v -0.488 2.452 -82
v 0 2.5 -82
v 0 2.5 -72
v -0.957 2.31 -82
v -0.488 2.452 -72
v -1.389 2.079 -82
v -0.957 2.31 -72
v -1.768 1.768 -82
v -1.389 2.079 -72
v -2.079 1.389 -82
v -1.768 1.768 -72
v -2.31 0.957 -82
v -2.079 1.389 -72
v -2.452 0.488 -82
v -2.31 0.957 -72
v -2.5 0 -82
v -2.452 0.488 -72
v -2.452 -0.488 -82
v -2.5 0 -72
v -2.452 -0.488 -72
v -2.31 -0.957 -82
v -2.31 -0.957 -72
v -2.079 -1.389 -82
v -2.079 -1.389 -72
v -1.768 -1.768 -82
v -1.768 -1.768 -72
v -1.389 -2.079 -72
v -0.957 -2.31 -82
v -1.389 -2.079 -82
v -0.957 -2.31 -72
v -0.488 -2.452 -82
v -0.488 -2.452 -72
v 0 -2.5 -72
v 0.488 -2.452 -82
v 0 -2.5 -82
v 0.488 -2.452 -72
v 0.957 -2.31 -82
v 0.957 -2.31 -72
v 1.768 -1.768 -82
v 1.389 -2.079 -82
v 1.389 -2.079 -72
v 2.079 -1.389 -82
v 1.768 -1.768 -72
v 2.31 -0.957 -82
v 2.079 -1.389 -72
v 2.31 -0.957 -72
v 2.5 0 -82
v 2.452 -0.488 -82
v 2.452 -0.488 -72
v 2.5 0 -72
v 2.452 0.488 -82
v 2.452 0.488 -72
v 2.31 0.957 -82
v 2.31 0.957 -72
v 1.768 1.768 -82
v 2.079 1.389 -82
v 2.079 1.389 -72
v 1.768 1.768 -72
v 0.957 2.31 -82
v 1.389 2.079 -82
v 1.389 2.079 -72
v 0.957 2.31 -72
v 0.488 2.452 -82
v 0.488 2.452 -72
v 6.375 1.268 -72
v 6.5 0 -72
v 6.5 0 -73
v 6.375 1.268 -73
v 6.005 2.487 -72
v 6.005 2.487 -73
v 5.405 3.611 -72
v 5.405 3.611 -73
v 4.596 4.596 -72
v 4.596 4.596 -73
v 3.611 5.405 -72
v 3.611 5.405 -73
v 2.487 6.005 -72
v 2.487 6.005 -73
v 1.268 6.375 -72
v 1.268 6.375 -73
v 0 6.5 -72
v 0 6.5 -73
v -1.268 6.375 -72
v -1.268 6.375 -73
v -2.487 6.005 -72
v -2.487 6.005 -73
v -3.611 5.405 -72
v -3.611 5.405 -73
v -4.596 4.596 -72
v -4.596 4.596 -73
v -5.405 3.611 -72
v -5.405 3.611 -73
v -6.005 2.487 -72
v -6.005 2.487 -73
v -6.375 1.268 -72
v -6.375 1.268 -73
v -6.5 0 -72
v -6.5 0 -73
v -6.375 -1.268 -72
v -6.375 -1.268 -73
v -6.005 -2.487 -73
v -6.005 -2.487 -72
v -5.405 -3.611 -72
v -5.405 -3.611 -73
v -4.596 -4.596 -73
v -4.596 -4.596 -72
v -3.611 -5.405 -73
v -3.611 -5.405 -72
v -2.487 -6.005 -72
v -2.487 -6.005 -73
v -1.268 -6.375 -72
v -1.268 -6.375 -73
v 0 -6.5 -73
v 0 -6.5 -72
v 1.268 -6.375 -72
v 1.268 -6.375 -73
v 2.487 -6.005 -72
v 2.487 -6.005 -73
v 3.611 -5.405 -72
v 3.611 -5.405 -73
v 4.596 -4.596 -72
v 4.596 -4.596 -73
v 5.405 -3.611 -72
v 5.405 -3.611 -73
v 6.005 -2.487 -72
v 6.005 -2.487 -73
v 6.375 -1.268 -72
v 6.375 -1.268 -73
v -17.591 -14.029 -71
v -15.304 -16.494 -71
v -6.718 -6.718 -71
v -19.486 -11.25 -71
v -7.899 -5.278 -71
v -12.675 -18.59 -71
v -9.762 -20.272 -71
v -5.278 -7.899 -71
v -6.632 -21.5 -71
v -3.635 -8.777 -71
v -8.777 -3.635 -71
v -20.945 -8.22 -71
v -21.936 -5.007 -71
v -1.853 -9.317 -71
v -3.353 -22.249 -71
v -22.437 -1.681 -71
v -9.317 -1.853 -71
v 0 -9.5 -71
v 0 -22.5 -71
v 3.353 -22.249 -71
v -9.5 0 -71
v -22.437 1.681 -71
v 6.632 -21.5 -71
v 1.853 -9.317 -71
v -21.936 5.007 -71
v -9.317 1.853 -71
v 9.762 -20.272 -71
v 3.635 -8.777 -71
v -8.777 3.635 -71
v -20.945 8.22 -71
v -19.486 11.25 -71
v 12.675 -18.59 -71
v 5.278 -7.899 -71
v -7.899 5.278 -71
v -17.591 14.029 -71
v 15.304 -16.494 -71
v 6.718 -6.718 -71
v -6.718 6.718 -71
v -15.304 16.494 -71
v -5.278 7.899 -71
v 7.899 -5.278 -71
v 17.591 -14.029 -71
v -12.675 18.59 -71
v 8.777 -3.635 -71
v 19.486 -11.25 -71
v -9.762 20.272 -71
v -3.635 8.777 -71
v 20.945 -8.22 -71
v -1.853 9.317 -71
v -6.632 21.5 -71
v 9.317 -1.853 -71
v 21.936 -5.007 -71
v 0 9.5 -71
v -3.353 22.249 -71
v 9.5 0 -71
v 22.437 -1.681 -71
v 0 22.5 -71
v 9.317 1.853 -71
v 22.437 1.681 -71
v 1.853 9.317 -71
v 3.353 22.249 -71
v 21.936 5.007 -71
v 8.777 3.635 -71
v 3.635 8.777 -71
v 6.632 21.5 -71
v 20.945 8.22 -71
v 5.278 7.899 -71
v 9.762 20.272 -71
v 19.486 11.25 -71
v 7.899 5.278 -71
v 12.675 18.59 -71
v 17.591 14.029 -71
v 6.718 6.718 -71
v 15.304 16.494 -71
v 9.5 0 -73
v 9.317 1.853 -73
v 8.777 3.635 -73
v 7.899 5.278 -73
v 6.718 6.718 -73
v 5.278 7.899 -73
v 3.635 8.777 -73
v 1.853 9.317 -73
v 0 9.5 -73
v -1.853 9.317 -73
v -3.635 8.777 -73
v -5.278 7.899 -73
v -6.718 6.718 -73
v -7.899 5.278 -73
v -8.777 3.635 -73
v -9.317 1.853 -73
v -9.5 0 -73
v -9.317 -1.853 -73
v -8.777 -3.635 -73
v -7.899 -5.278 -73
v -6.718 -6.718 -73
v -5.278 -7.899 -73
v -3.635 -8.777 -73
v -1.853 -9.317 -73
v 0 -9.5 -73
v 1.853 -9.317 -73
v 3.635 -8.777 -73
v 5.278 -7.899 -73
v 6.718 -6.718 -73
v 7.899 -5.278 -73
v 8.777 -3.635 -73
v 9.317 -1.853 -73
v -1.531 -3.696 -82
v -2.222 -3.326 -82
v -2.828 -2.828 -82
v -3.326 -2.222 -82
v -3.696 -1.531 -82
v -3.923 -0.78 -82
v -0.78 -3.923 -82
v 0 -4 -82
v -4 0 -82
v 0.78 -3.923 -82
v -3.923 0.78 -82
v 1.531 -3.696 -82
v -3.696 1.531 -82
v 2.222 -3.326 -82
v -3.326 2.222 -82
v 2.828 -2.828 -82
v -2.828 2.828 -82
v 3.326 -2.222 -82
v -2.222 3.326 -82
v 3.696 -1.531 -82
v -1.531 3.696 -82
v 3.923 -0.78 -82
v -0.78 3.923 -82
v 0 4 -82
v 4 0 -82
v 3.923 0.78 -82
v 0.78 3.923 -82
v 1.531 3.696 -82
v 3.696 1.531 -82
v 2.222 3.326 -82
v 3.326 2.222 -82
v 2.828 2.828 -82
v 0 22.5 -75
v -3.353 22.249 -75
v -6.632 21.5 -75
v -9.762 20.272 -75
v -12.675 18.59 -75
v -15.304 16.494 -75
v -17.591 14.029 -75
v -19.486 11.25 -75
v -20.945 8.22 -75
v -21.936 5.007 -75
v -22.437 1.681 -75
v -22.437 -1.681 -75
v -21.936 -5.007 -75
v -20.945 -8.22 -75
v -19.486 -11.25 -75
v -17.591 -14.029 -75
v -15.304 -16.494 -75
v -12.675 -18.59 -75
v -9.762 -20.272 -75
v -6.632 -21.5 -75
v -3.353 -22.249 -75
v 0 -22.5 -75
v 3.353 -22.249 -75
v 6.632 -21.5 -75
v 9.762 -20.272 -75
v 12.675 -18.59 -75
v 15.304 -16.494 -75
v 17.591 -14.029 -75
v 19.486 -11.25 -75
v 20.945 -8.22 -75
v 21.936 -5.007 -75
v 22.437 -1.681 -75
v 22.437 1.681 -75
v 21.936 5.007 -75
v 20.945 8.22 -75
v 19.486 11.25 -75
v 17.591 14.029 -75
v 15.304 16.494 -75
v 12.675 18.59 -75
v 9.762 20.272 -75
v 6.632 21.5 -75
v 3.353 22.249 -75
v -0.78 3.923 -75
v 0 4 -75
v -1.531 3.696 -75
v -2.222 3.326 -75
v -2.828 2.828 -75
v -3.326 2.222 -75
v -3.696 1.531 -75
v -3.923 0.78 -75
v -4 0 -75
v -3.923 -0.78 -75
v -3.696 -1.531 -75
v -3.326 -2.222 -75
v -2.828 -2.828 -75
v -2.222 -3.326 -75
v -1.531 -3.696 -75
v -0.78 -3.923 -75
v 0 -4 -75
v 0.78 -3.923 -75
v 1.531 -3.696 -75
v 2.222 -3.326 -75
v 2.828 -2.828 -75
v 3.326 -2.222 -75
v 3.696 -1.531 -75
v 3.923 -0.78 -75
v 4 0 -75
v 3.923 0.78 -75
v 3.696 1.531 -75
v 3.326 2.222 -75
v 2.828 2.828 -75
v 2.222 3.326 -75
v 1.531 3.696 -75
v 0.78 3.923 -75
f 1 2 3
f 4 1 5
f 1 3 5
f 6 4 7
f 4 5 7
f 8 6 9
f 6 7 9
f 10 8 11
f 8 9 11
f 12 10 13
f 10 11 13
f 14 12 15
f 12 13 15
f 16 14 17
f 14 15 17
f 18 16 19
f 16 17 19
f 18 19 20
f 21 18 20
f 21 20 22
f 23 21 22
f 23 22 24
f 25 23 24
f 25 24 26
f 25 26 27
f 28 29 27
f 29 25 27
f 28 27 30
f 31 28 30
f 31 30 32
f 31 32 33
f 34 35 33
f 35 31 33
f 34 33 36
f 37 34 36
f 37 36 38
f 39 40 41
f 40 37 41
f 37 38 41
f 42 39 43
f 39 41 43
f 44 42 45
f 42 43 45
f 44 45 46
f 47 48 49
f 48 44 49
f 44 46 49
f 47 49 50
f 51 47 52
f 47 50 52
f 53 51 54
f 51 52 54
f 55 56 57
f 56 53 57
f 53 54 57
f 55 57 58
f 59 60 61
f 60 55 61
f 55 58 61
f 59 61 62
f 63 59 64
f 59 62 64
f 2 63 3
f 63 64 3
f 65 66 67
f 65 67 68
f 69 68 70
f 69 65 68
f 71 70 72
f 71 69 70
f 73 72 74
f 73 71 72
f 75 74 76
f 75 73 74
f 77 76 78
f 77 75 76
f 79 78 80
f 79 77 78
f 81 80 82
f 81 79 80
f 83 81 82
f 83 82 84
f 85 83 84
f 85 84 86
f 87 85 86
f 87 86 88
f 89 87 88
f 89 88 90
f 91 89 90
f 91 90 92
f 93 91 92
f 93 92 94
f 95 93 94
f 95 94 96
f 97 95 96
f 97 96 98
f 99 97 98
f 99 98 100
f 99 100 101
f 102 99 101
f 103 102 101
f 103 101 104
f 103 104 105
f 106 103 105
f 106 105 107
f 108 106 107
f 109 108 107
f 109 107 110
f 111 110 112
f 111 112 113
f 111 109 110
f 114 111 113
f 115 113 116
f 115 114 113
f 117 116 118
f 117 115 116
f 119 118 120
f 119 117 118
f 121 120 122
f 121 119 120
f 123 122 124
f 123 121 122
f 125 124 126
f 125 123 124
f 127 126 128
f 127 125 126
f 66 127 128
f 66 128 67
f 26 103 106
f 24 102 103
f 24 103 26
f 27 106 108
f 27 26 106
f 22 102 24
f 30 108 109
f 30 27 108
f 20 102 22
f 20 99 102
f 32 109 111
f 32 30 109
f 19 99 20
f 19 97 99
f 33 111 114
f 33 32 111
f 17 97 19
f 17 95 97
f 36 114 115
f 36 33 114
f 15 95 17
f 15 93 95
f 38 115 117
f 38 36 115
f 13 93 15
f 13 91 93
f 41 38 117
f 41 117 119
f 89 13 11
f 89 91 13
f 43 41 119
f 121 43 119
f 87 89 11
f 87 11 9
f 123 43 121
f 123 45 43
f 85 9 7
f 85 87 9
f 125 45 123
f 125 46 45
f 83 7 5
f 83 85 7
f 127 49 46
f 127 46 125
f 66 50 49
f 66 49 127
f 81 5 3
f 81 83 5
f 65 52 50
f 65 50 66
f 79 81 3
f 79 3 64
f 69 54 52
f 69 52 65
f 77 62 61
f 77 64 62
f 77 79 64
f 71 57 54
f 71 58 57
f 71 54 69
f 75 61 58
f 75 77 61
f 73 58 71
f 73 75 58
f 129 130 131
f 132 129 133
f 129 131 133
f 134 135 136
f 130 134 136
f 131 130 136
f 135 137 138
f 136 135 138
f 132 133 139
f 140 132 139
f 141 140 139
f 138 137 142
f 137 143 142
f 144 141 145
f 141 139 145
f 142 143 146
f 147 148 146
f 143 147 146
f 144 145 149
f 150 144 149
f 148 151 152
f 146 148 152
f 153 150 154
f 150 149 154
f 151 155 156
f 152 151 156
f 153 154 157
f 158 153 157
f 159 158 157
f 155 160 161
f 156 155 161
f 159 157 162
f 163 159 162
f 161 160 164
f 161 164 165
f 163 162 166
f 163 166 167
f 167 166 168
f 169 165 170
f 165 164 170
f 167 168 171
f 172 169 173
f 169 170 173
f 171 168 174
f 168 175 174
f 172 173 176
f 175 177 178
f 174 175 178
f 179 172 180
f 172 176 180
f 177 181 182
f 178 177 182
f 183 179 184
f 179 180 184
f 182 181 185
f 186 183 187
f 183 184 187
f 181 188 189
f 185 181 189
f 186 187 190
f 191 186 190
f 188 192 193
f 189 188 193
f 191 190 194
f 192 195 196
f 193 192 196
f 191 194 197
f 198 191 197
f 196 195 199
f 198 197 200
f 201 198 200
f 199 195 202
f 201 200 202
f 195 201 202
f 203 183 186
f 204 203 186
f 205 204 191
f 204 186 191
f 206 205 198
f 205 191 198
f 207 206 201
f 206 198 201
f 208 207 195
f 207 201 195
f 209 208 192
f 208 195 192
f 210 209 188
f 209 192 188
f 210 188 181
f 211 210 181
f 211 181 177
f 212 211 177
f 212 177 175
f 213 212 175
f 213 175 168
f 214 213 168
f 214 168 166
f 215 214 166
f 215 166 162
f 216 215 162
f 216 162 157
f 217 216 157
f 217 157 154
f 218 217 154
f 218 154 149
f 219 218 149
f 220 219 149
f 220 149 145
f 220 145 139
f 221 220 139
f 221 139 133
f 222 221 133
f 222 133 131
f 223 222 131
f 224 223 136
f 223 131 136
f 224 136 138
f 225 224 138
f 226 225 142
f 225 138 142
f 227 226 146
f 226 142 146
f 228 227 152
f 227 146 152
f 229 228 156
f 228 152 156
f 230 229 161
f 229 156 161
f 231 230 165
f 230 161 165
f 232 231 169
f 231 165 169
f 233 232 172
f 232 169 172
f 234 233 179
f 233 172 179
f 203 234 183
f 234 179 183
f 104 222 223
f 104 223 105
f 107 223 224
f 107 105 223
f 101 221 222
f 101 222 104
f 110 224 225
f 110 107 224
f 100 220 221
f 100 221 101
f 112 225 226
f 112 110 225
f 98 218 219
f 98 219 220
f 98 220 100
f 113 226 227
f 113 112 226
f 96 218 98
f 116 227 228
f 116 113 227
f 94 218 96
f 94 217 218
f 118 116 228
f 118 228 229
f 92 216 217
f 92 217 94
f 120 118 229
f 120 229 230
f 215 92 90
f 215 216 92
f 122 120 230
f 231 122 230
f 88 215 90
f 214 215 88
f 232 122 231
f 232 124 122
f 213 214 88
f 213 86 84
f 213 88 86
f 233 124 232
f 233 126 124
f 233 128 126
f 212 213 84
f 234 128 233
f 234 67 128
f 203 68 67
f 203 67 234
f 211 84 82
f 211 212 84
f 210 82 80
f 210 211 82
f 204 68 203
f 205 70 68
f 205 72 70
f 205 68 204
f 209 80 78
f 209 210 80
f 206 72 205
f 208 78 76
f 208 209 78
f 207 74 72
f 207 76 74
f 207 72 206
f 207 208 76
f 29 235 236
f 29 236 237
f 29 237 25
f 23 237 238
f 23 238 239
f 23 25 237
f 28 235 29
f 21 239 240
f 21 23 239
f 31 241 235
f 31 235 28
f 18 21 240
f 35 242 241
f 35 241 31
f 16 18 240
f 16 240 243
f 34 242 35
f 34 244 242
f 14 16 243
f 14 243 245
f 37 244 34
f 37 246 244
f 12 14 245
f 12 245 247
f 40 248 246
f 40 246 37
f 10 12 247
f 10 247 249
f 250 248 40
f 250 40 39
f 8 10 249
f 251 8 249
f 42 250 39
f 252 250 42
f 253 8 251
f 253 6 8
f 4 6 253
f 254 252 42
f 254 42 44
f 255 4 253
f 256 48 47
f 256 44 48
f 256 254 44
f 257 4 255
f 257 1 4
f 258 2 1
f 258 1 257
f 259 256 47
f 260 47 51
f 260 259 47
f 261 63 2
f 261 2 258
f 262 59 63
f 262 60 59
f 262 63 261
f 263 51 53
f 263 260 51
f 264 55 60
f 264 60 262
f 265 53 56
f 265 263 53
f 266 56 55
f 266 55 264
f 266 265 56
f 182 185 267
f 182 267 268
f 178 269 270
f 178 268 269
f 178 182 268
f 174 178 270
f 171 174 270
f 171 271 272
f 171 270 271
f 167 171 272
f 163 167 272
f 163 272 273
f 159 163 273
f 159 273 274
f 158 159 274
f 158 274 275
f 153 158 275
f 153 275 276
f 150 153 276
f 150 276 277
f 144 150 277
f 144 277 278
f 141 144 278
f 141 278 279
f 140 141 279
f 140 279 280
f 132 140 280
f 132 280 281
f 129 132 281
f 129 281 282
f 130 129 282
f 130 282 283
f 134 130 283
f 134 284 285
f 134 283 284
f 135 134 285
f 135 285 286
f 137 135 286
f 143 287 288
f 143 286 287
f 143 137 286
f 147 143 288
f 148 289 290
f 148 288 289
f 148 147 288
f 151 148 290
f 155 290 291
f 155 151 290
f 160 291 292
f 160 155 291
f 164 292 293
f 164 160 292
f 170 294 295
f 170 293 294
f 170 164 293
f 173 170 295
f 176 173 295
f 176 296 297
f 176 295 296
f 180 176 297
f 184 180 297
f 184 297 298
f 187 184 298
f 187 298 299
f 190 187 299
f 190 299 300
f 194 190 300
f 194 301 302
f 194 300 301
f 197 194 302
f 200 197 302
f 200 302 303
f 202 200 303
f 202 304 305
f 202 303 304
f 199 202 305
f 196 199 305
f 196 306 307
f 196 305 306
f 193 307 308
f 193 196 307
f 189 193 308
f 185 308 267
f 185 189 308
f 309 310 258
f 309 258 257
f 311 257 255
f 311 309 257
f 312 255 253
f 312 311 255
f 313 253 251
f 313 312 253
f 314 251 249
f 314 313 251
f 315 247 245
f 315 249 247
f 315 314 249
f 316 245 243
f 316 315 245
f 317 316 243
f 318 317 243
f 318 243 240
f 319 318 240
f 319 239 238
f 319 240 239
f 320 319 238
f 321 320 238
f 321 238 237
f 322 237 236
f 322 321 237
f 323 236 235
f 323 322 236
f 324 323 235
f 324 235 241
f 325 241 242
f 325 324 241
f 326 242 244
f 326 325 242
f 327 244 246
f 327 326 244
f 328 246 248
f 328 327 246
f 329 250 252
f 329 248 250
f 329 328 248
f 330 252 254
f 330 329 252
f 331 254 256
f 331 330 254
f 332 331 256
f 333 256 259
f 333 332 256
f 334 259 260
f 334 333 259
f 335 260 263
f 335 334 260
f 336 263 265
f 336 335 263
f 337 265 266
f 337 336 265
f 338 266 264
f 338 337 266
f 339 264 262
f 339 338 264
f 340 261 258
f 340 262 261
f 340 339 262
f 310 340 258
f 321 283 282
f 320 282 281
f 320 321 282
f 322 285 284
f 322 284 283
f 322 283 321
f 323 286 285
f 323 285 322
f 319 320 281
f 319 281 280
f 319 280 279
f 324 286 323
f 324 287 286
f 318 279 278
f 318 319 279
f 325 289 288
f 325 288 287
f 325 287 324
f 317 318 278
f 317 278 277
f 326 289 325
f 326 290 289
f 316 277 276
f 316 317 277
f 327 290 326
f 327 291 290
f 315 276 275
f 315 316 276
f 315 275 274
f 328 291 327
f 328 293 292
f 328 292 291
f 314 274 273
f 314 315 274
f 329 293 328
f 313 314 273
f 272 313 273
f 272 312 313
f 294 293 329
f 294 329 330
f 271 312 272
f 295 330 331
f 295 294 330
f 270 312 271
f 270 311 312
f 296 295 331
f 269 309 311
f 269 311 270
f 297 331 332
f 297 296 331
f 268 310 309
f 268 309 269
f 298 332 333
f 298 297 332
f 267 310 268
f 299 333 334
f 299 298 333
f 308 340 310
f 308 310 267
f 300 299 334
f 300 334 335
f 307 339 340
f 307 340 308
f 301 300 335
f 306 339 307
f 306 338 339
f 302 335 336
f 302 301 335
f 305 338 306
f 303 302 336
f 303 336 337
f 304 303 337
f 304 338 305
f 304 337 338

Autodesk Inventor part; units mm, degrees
ref_plane "YZ Plane" through (0, 0, 0) normal (1, 0, 0) x (0, 1, 0)
ref_plane "XZ Plane" through (0, 0, 0) normal (0, 1, 0) x (-1, 0, 0)
ref_plane "XY Plane" through (0, 0, 0) normal (0, 0, 1) x (1, 0, 0)
sketch "Sketch1" plane through (0, 0, 0) normal (1, 0, 0) x (0, 1, 0)
  line L0 (0, 0) -> (2.5, 0)
  line L1 (0, 0) -> (4, 0)
  line L2 (2.5, 0) -> (2.5, -7)
  line L3 (2.5, -7) -> (0, -7)
  line L4 (0, -7) -> (20, -7)
  line L5 (4, 0) -> (4, -7)
  line L6 (2.5, -7) -> (2.5, -41)
  line L7 (20, -7) -> (20, -11)
  line L8 (20, -11) -> (2.5, -11)
  line L9 (20, -7) -> (22.5, -7)
  line L10 (22.5, -7) -> (22.5, -11)
  line L11 (22.5, -11) -> (20, -11)
  line L12 (20, -11) -> (20, -7)
  line L13 (20, -7) -> (20, -11)
  line L14 (4, 0) -> (2.5, 0)
  line L15 (2.5, 0) -> (2.5, -11)
  line L16 (2.5, -11) -> (4, -11)
  line L17 (4, -11) -> (4, 0)
  line L18 (2.5, -11) -> (22.5, -11)
  line L19 (22.5, -11) -> (22.5, -7)
  line L20 (22.5, -7) -> (2.5, -7)
  line L21 (2.5, -7) -> (2.5, -11)
  line L22 (2.5, -11) -> (6.5, -11)
  line L23 (0, -7) -> (0, -105.9451)
  line L24 (2.5, -41) -> (25, -41)
  line L25 (0, -82) -> (2.5, -82)
  line L26 (0, -82) -> (4, -82)
  line L27 (2.5, -82) -> (2.5, -75)
  line L28 (2.5, -75) -> (0, -75)
  line L29 (0, -75) -> (20, -75)
  line L30 (4, -82) -> (4, -75)
  line L31 (20, -75) -> (20, -71)
  line L32 (20, -71) -> (2.5, -71)
  line L33 (20, -75) -> (22.5, -75)
  line L34 (22.5, -75) -> (22.5, -71)
  line L35 (22.5, -71) -> (20, -71)
  line L36 (20, -71) -> (20, -75)
  line L37 (20, -75) -> (20, -71)
  line L38 (4, -82) -> (2.5, -82)
  line L39 (2.5, -82) -> (2.5, -71)
  line L40 (2.5, -71) -> (4, -71)
  line L41 (4, -71) -> (4, -82)
  line L42 (2.5, -71) -> (22.5, -71)
  line L43 (22.5, -71) -> (22.5, -75)
  line L44 (22.5, -75) -> (2.5, -75)
  line L45 (2.5, -75) -> (2.5, -71)
  line L46 (2.5, -71) -> (6.5, -71)
  line L47 (2.5, -11) -> (6.5, -11)
  line L48 (6.5, -11) -> (6.5, -71)
  line L49 (6.5, -71) -> (2.5, -71)
  line L50 (2.5, -71) -> (2.5, -11)
  line L51 (6.5, -11) -> (9.5, -11)
  line L52 (9.5, -11) -> (9.5, -14)
  line L53 (9.5, -14) -> (6.5, -14)
  line L54 (6.5, -14) -> (6.5, -11)
  line L55 (6.5, -71) -> (9.5, -71)
  line L56 (9.5, -71) -> (9.5, -68)
  line L57 (9.5, -68) -> (6.5, -68)
  line L58 (6.5, -68) -> (6.5, -71)
  dimension "d1" = 2.5
  dimension "d2" = 4
  dimension "d3" = 7
  dimension "d4" = 20
  dimension "d5" = 34
  dimension "d9" = 4
  dimension "d12" = 2.5
  dimension "d13" = 4
  dimension "d55" = 22.5
  dimension "d56" = 4
  dimension "d80" = 3
  dimension "d81" = 3
  dimension "d82" = 3
  dimension "d83" = 3
revolve "Revolution2" add sketch "Sketch1" angle 360 about axis through (0, 0, -7) along (0, 0, -1) contours L1 L5 L4 L2 | L4 L17 L8 L6 | L4 L7 L8 L17 | L8 L48 L24 L6 | L9 L10 L11 L7 | L24 L48 L32 L50 | L8 L52 L53 L48 | L29 L30 L26 L27 | L39 L32 L41 L29 | L41 L32 L31 L29 | L57 L56 L32 L48 | L31 L35 L34 L33
sketch "Sketch6" plane through (0, 0, 0) normal (0, 1, 0) x (-1, 0, 0)
  line L0 (-2.5, -82) -> (2.5, -82) projected
  line L1 (0, -82) -> (0, -62)
  line L2 (0, -82) -> (20, -82) construction
  line L3 (0, -65) -> (15, -65) construction
  line L4 (0, -59) -> (15, -59) construction
  line L5 (10.6066, -48.3934) -> (10.6066, -54.3934)
  line L6 (0, -65) -> (0, -59)
  line L7 (0, -62) -> (0, -59.5)
  line L8 (0, -59.5) -> (10.6066, -48.8934)
  line L9 (10.6066, -48.8934) -> (10.6066, -53.8934)
  line L10 (10.6066, -53.8934) -> (0, -64.5)
  line L11 (0, -59.5) -> (0, -64.5)
  point P0 (0, 0)
  dimension "d64" = 20
  dimension "d65" = 90
  dimension "d69" = 15
  dimension "d71" = 15
  dimension "d75" = 2.5
  dimension "d76" = 5
extrude "Extrusion6" cut sketch "Sketch6" along normal mid plane 5
sketch "Sketch7" plane through (0, 0, 0) normal (0, 0, 1) x (1, 0, 0)
  arc A0 (-1.9966, -1.5104) -> (-1.9966, 1.4896) centre (0.0034, -0.0104) ccw
  line L0 (-1.9966, -0.0104) -> (-1.9966, 1.4896)
  line L1 (-1.9966, -0.0104) -> (-1.9966, -1.5104)
  line L2 (-1.9966, 1.4896) -> (-1.9966, -2.007)
  line L3 (-1.9966, -2.007) -> (-3.9862, -2.007)
  line L4 (-3.9862, -2.007) -> (-3.9862, 1.4896)
  line L5 (-3.9862, 1.4896) -> (-1.9966, 1.4896)
  line L6 (-1.9966, -1.5104) -> (-3.2272, -1.5104)
  line L7 (-3.2272, -1.5104) -> (-3.2272, 1.4896)
  line L8 (-3.2272, 1.4896) -> (-1.9966, 1.4896)
  line L9 (-1.9966, 1.4896) -> (-1.9966, -1.5104)
  point P0 (0, 0)
  point P1 (0, 0)
  dimension "d77" = 5
extrude "Extrusion7" add sketch "Sketch7" against normal blind 26 contours L6 L7 L5 L0 L1
sketch "Sketch8" plane through (0, 0, -68) normal (0, 0, 1) x (1, 0, 0)
  arc A0 (0, 2.5) -> (0, -2.5) centre (0, 0) ccw projected
  circle A1 centre (0, 0) radius 6.5
  point P0 (0, 0)
extrude "Extrusion8" cut sketch "Sketch8" against normal blind 4
sketch "Sketch9" plane through (0, 0, -68) normal (0, 0, 1) x (1, 0, 0)
  circle A0 centre (0, 0) radius 2.5 projected
  circle A1 centre (0, 0) radius 22.5
  point P0 (0, 0)
extrude "Extrusion9" cut sketch "Sketch9" along normal blind 100 contours A0 | A1
sketch "Sketch10" plane through (0, 0, -68) normal (0, 0, 1) x (1, 0, 0)
  circle A0 centre (0, 0) radius 9.5
  circle A1 centre (0, 0) radius 6.5
extrude "Extrusion10" cut sketch "Sketch10" against normal blind 5
properties part number "Spool_revB1"
